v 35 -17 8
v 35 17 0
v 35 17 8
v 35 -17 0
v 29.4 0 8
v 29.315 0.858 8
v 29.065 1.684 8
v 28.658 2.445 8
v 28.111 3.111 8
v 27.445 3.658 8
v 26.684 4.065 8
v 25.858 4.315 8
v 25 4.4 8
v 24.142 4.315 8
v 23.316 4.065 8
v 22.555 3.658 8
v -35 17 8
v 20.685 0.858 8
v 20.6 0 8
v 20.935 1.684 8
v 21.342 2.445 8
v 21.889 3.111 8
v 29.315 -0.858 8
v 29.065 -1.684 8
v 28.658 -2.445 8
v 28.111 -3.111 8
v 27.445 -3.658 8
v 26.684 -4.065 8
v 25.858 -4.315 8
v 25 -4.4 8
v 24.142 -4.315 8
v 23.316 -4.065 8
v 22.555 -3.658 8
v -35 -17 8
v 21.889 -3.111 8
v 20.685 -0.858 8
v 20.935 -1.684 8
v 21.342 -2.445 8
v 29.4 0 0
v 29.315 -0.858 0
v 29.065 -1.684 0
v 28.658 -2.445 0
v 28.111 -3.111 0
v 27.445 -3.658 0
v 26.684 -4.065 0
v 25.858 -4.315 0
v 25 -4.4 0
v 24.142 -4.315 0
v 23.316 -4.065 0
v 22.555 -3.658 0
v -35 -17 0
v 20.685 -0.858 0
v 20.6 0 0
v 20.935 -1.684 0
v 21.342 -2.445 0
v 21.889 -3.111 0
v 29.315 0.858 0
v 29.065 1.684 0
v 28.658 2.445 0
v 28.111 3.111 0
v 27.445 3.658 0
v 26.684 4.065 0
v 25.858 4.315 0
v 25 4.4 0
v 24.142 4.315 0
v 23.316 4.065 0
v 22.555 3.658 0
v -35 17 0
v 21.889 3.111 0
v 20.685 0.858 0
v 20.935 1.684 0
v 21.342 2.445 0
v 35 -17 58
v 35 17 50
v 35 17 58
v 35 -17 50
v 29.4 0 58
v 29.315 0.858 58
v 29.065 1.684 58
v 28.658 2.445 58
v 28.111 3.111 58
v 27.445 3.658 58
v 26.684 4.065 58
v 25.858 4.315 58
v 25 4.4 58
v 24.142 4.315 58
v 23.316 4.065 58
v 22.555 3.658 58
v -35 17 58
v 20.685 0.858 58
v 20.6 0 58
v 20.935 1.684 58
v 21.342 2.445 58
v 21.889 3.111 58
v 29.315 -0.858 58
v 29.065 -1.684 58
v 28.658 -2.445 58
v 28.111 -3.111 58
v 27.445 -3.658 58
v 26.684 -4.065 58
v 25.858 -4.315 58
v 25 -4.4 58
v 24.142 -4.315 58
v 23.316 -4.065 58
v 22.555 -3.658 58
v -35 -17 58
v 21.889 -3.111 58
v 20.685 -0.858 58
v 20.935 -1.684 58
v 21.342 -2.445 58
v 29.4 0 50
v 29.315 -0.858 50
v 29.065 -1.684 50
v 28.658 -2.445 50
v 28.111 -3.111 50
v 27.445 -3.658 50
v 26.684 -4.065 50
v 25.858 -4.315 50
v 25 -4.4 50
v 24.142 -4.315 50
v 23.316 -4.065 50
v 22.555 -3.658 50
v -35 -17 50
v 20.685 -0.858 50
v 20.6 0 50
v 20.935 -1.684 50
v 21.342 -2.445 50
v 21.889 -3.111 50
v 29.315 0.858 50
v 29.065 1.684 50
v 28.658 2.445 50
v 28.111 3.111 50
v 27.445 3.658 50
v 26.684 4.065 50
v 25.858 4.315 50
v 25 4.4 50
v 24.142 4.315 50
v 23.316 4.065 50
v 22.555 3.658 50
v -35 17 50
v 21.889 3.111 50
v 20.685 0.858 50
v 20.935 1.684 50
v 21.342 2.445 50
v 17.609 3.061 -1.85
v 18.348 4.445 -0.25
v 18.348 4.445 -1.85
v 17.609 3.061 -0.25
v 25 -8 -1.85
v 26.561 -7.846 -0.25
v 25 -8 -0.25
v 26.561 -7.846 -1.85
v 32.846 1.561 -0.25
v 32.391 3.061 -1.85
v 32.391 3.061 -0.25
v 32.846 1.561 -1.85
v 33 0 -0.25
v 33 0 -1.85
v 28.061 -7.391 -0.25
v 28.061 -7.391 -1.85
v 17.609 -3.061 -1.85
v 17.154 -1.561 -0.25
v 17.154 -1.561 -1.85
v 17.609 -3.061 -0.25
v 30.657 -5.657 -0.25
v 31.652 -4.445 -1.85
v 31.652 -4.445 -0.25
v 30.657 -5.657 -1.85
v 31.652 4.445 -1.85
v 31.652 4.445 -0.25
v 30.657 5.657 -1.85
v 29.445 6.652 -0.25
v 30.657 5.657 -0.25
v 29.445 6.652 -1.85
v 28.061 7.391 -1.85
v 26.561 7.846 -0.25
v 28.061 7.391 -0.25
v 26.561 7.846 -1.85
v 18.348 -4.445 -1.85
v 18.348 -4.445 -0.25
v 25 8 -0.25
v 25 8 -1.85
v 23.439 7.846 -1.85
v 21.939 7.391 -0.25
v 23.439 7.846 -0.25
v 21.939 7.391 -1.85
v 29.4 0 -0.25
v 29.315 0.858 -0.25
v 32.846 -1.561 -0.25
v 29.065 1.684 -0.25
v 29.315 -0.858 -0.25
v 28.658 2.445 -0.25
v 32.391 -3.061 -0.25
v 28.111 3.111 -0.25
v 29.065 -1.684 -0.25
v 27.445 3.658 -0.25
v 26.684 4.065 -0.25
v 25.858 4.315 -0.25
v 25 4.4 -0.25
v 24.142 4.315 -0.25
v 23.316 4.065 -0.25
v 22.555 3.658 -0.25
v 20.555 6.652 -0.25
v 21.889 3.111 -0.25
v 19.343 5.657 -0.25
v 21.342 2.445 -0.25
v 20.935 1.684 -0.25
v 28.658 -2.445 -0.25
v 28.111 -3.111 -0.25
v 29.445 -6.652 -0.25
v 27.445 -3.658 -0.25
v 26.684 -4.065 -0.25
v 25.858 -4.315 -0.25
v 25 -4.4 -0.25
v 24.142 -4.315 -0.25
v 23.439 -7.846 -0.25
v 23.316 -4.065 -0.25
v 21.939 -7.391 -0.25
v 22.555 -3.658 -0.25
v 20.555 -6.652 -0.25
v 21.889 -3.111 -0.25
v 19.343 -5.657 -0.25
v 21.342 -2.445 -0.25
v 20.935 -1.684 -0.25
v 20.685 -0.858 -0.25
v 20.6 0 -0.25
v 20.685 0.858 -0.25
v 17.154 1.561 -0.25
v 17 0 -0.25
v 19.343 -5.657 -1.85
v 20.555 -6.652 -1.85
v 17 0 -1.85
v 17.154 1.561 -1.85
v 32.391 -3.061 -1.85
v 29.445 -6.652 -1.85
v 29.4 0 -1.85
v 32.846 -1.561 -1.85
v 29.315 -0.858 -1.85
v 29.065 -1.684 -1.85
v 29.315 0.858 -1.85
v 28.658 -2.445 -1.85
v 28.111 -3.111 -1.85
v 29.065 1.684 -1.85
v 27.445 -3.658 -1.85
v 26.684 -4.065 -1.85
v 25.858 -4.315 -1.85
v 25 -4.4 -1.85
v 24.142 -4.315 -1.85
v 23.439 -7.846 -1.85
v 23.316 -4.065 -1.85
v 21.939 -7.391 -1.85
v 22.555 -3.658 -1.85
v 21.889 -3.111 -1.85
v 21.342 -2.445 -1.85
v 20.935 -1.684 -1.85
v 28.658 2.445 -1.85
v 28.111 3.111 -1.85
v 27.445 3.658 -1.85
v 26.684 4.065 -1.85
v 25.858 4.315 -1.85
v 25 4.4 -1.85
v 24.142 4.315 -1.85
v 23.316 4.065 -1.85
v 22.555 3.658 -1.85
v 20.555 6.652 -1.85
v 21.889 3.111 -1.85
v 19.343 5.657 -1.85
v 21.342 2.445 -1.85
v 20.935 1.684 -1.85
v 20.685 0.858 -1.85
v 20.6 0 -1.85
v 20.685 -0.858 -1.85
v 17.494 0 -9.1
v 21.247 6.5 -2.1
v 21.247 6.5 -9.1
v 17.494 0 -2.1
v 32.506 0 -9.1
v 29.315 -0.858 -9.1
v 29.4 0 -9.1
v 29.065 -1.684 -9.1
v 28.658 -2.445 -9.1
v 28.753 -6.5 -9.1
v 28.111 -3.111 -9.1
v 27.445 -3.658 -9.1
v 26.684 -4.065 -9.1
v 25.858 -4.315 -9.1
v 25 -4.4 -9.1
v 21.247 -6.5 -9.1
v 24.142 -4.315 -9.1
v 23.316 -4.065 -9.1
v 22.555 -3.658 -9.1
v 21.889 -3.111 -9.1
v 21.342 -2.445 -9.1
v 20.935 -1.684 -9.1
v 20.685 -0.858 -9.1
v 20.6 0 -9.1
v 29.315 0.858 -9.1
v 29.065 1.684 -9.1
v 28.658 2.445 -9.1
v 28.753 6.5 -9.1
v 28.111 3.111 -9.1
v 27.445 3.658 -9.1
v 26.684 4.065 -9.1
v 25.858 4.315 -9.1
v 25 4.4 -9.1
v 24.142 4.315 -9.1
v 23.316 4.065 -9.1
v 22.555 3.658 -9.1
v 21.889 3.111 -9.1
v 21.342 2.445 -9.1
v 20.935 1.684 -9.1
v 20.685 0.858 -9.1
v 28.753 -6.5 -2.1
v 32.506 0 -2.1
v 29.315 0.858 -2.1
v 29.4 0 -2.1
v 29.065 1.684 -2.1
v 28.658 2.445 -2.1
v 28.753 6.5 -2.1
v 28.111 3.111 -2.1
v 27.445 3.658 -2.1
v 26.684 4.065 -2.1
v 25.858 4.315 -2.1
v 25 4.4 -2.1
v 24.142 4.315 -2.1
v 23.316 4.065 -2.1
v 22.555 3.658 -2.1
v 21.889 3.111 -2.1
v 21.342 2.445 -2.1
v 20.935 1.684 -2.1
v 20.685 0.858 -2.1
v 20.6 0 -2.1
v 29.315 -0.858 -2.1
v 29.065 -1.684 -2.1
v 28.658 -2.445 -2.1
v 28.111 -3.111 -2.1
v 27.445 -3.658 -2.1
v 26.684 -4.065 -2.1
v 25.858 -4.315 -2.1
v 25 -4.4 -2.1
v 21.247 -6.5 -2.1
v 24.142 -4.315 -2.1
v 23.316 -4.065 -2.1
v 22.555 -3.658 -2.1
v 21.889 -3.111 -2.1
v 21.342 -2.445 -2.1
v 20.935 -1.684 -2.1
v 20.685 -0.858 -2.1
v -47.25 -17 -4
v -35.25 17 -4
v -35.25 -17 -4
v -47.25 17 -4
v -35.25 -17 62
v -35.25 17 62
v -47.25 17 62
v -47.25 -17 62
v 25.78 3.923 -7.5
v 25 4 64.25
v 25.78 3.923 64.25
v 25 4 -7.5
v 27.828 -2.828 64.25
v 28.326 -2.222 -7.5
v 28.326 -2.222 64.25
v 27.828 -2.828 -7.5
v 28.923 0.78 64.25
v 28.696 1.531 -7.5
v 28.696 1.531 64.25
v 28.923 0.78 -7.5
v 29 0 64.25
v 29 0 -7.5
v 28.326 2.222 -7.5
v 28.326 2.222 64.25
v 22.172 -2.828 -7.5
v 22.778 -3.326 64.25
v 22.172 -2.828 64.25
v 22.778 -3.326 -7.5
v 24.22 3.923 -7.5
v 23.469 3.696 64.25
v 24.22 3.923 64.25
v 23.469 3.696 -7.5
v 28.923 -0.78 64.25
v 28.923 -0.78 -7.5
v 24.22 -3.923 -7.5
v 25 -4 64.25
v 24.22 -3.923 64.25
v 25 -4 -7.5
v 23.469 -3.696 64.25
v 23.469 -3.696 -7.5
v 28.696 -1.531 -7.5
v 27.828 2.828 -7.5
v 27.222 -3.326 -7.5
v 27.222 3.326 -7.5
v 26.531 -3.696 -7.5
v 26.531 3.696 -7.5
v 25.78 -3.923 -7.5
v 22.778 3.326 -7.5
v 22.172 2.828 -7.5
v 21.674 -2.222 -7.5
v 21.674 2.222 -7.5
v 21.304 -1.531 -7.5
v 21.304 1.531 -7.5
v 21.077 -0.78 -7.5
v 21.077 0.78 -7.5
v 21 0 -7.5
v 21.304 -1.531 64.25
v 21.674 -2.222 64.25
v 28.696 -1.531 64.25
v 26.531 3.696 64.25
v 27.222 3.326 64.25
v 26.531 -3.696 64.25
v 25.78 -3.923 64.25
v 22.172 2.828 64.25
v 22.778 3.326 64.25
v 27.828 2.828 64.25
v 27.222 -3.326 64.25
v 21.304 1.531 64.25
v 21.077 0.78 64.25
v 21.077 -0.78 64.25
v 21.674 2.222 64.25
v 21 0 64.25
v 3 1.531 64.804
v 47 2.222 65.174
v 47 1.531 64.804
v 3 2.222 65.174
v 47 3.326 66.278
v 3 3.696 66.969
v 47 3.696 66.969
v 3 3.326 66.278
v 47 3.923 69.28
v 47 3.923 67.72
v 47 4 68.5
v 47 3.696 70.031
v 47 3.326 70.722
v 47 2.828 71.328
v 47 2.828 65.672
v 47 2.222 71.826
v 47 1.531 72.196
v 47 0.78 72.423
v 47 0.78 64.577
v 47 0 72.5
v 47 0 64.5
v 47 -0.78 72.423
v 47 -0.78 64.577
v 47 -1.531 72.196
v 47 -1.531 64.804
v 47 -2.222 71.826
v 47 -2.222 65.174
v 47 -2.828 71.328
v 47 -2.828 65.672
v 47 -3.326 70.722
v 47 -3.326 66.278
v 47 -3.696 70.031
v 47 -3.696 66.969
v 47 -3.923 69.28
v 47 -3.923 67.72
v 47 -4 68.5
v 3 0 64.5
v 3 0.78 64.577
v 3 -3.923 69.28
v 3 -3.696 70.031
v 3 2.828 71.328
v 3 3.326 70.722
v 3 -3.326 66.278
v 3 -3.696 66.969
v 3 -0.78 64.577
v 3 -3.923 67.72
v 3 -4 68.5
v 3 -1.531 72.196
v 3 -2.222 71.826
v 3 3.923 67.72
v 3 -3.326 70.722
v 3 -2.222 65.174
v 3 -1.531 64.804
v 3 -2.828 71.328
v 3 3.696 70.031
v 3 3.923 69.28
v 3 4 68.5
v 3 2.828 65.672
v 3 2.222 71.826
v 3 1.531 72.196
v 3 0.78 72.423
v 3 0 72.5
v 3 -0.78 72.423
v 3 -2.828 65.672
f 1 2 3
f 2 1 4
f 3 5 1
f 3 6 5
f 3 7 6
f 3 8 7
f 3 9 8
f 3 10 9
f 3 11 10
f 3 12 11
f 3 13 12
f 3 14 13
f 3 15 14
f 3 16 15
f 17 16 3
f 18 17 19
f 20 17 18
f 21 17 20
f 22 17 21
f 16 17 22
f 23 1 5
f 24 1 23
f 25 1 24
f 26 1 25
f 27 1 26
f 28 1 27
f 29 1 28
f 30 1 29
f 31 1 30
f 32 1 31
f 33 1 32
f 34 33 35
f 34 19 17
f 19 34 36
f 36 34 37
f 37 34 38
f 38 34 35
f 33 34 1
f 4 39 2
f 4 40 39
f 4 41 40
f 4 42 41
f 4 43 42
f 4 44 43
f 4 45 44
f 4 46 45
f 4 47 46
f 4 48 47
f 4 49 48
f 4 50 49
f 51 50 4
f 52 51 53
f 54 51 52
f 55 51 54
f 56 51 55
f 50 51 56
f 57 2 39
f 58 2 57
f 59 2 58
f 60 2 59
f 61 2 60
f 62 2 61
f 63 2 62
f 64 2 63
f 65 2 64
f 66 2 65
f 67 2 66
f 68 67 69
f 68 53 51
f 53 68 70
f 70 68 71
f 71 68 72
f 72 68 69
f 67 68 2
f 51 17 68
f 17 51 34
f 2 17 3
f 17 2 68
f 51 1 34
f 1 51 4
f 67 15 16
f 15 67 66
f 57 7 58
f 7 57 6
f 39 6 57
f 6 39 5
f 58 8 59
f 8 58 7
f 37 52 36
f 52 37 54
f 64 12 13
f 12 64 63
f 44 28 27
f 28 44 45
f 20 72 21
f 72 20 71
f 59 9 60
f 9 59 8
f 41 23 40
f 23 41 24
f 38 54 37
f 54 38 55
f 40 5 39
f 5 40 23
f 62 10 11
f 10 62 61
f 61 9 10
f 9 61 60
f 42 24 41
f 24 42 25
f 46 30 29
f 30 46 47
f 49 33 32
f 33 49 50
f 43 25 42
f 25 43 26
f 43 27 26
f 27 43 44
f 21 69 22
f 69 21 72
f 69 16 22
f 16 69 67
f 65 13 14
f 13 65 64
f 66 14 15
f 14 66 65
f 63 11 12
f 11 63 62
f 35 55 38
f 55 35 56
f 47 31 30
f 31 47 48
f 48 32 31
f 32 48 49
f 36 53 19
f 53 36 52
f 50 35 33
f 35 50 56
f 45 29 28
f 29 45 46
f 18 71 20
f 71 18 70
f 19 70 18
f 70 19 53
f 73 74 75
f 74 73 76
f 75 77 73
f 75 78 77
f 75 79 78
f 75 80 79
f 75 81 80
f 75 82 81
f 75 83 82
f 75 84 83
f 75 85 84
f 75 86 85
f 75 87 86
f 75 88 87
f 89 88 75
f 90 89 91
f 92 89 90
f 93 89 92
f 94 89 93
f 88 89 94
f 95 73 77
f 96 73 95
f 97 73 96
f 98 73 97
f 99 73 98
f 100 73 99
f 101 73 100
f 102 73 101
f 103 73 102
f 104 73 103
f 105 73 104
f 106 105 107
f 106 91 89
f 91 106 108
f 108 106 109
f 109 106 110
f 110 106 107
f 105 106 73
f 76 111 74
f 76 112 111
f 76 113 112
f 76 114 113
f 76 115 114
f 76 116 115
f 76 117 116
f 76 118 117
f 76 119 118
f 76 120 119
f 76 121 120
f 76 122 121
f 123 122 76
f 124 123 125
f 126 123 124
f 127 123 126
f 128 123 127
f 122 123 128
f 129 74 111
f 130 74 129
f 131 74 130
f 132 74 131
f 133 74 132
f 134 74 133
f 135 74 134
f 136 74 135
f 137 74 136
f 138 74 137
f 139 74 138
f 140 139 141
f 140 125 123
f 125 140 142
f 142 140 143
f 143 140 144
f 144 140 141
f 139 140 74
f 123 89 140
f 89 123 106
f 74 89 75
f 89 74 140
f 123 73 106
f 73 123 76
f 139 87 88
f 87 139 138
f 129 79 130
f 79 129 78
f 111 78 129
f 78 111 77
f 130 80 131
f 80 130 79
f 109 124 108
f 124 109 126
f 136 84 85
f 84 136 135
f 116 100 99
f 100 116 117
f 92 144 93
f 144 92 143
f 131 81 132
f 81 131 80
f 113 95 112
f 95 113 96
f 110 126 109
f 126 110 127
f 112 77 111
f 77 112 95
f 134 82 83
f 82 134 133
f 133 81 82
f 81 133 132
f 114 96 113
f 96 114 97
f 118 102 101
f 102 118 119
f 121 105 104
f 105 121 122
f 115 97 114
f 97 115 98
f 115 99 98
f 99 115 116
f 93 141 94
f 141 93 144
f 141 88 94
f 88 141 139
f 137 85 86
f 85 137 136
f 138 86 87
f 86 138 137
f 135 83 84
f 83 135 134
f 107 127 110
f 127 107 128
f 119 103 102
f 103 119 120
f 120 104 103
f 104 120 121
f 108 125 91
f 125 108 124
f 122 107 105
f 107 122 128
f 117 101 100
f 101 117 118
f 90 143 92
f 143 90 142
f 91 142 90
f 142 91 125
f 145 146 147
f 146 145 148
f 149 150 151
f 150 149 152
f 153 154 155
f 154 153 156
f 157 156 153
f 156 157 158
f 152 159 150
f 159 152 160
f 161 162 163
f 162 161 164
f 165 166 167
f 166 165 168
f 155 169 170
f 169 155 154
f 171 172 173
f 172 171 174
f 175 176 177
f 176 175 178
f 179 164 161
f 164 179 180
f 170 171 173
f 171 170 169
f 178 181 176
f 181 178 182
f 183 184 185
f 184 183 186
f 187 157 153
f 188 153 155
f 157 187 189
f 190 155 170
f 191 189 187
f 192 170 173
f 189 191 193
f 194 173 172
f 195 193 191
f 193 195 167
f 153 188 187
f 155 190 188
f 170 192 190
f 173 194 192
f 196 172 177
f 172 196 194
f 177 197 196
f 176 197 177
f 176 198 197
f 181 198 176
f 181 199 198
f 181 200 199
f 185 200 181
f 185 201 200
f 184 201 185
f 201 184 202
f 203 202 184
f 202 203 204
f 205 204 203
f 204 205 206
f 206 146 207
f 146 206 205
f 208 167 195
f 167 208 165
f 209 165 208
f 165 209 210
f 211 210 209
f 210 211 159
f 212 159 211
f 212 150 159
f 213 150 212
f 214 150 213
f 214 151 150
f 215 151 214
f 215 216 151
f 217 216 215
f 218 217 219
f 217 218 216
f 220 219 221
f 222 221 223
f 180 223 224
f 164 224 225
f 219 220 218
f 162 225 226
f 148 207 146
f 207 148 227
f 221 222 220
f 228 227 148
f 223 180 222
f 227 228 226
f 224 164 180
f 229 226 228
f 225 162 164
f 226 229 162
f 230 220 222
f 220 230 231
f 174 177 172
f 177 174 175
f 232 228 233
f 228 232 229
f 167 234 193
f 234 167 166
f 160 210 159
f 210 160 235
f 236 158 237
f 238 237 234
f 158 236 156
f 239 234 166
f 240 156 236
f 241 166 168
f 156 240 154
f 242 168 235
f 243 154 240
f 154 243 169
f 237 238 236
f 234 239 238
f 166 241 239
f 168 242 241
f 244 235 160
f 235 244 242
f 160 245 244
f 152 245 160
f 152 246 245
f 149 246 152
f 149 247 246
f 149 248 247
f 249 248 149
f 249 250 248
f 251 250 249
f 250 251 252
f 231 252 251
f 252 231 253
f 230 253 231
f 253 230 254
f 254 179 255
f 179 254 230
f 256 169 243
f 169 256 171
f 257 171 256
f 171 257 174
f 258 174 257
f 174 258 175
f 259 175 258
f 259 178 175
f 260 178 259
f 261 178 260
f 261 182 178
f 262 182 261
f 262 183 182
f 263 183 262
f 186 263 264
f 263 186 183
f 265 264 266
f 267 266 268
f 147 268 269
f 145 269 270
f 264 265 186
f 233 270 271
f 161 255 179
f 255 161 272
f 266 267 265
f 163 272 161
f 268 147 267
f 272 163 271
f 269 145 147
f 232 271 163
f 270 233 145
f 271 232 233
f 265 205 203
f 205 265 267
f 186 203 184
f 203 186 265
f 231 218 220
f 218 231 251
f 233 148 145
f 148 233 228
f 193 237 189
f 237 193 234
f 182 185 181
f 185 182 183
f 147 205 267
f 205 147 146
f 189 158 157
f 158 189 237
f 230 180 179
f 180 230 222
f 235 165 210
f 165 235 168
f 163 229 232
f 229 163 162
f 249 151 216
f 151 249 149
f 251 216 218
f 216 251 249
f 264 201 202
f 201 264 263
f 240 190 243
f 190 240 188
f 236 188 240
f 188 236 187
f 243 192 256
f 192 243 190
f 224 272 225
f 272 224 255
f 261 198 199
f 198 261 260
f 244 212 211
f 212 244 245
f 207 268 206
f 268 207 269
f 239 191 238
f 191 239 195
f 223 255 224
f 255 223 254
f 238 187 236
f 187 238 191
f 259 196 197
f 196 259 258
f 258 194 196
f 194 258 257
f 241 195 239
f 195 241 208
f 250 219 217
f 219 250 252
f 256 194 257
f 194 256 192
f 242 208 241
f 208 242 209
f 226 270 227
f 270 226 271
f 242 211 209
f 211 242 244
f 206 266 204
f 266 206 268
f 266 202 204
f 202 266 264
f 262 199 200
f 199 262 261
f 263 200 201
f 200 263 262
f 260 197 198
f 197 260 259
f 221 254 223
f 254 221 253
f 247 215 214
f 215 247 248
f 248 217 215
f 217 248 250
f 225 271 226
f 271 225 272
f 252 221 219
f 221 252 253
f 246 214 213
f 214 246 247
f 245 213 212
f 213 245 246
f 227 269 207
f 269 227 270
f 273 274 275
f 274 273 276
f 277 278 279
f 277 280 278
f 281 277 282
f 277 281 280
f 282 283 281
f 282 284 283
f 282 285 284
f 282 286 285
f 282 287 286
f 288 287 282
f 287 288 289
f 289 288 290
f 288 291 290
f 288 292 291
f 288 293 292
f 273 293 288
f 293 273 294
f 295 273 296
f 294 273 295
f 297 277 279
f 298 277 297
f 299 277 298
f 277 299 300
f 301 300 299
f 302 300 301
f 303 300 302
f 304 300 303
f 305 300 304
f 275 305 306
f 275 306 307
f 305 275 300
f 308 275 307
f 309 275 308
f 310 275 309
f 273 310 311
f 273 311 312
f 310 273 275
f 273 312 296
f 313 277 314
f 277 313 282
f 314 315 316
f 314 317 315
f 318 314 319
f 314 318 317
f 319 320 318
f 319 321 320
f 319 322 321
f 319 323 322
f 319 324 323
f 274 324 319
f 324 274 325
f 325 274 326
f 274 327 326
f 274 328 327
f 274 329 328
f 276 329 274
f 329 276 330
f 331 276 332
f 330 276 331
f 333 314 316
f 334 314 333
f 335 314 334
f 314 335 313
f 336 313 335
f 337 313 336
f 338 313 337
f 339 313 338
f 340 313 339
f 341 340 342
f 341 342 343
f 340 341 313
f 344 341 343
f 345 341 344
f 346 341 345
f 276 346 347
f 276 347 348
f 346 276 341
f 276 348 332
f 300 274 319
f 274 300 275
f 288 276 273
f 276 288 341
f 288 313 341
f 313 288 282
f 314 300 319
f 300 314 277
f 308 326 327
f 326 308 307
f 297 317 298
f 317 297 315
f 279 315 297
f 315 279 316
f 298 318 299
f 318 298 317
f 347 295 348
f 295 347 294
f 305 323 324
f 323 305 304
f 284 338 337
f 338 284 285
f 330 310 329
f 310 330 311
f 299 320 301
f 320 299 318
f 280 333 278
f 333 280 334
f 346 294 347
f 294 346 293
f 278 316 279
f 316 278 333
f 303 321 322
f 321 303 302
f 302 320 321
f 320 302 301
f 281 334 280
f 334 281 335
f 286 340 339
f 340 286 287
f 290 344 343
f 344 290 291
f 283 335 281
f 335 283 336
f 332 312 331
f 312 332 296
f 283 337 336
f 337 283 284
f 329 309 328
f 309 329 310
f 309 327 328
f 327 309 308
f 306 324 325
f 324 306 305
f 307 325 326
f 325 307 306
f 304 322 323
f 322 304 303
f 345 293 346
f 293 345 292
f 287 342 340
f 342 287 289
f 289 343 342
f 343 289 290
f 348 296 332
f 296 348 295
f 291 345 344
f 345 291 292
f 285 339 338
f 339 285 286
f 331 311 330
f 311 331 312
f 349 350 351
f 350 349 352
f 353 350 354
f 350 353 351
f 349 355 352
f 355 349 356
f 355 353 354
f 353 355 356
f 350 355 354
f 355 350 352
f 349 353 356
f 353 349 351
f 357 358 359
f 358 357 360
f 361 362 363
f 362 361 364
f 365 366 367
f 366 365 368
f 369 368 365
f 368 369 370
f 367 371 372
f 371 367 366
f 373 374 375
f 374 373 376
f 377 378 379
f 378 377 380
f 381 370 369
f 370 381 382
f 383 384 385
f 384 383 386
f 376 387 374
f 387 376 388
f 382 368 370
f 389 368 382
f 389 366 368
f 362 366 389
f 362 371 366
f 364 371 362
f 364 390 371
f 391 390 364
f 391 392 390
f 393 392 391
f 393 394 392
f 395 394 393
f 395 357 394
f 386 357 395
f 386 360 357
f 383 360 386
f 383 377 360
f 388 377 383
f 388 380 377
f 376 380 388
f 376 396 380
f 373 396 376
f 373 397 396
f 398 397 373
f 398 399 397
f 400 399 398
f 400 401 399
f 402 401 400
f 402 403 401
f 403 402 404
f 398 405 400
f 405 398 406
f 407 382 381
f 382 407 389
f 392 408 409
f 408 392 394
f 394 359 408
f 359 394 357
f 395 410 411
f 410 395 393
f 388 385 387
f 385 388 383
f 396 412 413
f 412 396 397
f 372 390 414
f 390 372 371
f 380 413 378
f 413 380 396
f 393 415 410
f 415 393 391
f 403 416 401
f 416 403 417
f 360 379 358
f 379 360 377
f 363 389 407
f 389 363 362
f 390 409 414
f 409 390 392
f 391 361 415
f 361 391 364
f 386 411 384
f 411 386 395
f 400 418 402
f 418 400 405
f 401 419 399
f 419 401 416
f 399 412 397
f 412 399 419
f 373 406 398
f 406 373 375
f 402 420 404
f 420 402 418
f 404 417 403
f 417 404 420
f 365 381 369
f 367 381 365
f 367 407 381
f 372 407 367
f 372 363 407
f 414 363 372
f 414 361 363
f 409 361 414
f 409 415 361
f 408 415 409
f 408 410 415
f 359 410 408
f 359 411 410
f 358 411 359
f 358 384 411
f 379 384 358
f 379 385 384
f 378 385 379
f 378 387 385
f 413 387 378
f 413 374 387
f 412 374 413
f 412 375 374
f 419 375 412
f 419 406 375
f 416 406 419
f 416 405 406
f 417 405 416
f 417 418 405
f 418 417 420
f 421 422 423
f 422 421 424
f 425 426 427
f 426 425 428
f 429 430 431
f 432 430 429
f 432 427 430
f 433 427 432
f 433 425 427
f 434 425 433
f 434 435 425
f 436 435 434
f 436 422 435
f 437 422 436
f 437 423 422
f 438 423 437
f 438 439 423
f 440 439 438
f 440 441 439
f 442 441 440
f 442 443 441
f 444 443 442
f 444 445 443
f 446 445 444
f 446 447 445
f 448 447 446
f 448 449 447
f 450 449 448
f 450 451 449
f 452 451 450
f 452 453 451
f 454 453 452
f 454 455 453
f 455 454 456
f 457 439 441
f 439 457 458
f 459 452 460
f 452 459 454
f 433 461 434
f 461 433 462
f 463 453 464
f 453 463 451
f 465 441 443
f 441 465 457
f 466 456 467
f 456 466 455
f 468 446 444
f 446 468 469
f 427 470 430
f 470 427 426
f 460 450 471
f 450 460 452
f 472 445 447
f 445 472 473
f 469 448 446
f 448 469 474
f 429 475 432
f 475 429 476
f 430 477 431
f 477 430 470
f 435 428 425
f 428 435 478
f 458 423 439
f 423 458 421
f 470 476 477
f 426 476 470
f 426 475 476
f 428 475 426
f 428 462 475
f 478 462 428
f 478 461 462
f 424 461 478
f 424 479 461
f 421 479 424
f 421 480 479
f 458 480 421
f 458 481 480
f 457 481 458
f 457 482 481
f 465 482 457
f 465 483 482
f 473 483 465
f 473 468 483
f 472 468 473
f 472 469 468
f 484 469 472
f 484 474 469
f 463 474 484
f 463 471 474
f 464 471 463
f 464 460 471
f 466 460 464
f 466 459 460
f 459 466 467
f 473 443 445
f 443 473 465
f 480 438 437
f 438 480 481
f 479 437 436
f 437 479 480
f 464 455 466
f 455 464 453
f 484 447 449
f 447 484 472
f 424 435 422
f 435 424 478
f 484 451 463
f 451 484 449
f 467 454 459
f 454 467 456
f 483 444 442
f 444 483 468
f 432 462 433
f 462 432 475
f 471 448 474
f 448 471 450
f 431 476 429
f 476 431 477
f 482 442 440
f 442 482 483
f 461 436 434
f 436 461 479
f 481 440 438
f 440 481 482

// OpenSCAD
$fn = 32;

// ------------------------------------------------------------------------
// C clamp: throat 50 mm, screw d8
// Every part is its own module, assembly() places every instance.
// ------------------------------------------------------------------------

// --- part 1 ---
module clamp_arm() {
  difference() {
    translate([-35, -17, 0]) cube([70, 34, 8]);
    translate([25, 0, -1]) cylinder(h = 10, d = 8.8);
  }
}

// --- part 2 ---
module clamp_spine() {
  difference() {
    translate([-33, -17, 0]) cube([66, 34, 12]);
  }
}

// --- part 3 ---
module clamp_screw() {
  translate([0, 0, -35.875]) cylinder(h = 71.75, d = 8);
}

// --- part 4 ---
module clamp_washer() {
  difference() {
      translate([0, 0, 0]) cylinder(h = 1.6, d = 16);
      translate([0, 0, -1]) cylinder(h = 3.6, d = 8.8);
    }
}

// --- part 5 ---
module clamp_nut() {
  difference() {
    linear_extrude(height = 7) polygon(points = [[7.506, 0], [3.753, 6.5], [-3.753, 6.5], [-7.506, 0], [-3.753, -6.5], [3.753, -6.5]]);
    translate([0, 0, -1]) cylinder(h = 9, d = 8.8);
  }
}

// --- part 6 ---
module tommy_bar() {
  translate([0, 0, -22]) cylinder(h = 44, d = 8);
}

// --- assembly ---
module assembly() {
  color([0.80, 0.24, 0.20]) translate([0, 0, 0]) rotate([0, 0, 0]) clamp_arm();
  color([0.20, 0.45, 0.75]) translate([0, 0, 50]) rotate([0, 0, 0]) clamp_arm();
  color([0.25, 0.62, 0.32]) translate([-47.25, 0, 29]) rotate([0, 90, 0]) clamp_spine();
  color([0.92, 0.70, 0.18]) translate([25, 0, 28.375]) rotate([0, 0, 0]) clamp_screw();
  color([0.58, 0.35, 0.70]) translate([25, 0, -1.85]) rotate([0, 0, 0]) clamp_washer();
  color([0.16, 0.66, 0.66]) translate([25, 0, -9.1]) rotate([0, 0, 0]) clamp_nut();
  color([0.85, 0.48, 0.18]) translate([25, 0, 68.5]) rotate([0, 90, 0]) tommy_bar();
}

assembly();
